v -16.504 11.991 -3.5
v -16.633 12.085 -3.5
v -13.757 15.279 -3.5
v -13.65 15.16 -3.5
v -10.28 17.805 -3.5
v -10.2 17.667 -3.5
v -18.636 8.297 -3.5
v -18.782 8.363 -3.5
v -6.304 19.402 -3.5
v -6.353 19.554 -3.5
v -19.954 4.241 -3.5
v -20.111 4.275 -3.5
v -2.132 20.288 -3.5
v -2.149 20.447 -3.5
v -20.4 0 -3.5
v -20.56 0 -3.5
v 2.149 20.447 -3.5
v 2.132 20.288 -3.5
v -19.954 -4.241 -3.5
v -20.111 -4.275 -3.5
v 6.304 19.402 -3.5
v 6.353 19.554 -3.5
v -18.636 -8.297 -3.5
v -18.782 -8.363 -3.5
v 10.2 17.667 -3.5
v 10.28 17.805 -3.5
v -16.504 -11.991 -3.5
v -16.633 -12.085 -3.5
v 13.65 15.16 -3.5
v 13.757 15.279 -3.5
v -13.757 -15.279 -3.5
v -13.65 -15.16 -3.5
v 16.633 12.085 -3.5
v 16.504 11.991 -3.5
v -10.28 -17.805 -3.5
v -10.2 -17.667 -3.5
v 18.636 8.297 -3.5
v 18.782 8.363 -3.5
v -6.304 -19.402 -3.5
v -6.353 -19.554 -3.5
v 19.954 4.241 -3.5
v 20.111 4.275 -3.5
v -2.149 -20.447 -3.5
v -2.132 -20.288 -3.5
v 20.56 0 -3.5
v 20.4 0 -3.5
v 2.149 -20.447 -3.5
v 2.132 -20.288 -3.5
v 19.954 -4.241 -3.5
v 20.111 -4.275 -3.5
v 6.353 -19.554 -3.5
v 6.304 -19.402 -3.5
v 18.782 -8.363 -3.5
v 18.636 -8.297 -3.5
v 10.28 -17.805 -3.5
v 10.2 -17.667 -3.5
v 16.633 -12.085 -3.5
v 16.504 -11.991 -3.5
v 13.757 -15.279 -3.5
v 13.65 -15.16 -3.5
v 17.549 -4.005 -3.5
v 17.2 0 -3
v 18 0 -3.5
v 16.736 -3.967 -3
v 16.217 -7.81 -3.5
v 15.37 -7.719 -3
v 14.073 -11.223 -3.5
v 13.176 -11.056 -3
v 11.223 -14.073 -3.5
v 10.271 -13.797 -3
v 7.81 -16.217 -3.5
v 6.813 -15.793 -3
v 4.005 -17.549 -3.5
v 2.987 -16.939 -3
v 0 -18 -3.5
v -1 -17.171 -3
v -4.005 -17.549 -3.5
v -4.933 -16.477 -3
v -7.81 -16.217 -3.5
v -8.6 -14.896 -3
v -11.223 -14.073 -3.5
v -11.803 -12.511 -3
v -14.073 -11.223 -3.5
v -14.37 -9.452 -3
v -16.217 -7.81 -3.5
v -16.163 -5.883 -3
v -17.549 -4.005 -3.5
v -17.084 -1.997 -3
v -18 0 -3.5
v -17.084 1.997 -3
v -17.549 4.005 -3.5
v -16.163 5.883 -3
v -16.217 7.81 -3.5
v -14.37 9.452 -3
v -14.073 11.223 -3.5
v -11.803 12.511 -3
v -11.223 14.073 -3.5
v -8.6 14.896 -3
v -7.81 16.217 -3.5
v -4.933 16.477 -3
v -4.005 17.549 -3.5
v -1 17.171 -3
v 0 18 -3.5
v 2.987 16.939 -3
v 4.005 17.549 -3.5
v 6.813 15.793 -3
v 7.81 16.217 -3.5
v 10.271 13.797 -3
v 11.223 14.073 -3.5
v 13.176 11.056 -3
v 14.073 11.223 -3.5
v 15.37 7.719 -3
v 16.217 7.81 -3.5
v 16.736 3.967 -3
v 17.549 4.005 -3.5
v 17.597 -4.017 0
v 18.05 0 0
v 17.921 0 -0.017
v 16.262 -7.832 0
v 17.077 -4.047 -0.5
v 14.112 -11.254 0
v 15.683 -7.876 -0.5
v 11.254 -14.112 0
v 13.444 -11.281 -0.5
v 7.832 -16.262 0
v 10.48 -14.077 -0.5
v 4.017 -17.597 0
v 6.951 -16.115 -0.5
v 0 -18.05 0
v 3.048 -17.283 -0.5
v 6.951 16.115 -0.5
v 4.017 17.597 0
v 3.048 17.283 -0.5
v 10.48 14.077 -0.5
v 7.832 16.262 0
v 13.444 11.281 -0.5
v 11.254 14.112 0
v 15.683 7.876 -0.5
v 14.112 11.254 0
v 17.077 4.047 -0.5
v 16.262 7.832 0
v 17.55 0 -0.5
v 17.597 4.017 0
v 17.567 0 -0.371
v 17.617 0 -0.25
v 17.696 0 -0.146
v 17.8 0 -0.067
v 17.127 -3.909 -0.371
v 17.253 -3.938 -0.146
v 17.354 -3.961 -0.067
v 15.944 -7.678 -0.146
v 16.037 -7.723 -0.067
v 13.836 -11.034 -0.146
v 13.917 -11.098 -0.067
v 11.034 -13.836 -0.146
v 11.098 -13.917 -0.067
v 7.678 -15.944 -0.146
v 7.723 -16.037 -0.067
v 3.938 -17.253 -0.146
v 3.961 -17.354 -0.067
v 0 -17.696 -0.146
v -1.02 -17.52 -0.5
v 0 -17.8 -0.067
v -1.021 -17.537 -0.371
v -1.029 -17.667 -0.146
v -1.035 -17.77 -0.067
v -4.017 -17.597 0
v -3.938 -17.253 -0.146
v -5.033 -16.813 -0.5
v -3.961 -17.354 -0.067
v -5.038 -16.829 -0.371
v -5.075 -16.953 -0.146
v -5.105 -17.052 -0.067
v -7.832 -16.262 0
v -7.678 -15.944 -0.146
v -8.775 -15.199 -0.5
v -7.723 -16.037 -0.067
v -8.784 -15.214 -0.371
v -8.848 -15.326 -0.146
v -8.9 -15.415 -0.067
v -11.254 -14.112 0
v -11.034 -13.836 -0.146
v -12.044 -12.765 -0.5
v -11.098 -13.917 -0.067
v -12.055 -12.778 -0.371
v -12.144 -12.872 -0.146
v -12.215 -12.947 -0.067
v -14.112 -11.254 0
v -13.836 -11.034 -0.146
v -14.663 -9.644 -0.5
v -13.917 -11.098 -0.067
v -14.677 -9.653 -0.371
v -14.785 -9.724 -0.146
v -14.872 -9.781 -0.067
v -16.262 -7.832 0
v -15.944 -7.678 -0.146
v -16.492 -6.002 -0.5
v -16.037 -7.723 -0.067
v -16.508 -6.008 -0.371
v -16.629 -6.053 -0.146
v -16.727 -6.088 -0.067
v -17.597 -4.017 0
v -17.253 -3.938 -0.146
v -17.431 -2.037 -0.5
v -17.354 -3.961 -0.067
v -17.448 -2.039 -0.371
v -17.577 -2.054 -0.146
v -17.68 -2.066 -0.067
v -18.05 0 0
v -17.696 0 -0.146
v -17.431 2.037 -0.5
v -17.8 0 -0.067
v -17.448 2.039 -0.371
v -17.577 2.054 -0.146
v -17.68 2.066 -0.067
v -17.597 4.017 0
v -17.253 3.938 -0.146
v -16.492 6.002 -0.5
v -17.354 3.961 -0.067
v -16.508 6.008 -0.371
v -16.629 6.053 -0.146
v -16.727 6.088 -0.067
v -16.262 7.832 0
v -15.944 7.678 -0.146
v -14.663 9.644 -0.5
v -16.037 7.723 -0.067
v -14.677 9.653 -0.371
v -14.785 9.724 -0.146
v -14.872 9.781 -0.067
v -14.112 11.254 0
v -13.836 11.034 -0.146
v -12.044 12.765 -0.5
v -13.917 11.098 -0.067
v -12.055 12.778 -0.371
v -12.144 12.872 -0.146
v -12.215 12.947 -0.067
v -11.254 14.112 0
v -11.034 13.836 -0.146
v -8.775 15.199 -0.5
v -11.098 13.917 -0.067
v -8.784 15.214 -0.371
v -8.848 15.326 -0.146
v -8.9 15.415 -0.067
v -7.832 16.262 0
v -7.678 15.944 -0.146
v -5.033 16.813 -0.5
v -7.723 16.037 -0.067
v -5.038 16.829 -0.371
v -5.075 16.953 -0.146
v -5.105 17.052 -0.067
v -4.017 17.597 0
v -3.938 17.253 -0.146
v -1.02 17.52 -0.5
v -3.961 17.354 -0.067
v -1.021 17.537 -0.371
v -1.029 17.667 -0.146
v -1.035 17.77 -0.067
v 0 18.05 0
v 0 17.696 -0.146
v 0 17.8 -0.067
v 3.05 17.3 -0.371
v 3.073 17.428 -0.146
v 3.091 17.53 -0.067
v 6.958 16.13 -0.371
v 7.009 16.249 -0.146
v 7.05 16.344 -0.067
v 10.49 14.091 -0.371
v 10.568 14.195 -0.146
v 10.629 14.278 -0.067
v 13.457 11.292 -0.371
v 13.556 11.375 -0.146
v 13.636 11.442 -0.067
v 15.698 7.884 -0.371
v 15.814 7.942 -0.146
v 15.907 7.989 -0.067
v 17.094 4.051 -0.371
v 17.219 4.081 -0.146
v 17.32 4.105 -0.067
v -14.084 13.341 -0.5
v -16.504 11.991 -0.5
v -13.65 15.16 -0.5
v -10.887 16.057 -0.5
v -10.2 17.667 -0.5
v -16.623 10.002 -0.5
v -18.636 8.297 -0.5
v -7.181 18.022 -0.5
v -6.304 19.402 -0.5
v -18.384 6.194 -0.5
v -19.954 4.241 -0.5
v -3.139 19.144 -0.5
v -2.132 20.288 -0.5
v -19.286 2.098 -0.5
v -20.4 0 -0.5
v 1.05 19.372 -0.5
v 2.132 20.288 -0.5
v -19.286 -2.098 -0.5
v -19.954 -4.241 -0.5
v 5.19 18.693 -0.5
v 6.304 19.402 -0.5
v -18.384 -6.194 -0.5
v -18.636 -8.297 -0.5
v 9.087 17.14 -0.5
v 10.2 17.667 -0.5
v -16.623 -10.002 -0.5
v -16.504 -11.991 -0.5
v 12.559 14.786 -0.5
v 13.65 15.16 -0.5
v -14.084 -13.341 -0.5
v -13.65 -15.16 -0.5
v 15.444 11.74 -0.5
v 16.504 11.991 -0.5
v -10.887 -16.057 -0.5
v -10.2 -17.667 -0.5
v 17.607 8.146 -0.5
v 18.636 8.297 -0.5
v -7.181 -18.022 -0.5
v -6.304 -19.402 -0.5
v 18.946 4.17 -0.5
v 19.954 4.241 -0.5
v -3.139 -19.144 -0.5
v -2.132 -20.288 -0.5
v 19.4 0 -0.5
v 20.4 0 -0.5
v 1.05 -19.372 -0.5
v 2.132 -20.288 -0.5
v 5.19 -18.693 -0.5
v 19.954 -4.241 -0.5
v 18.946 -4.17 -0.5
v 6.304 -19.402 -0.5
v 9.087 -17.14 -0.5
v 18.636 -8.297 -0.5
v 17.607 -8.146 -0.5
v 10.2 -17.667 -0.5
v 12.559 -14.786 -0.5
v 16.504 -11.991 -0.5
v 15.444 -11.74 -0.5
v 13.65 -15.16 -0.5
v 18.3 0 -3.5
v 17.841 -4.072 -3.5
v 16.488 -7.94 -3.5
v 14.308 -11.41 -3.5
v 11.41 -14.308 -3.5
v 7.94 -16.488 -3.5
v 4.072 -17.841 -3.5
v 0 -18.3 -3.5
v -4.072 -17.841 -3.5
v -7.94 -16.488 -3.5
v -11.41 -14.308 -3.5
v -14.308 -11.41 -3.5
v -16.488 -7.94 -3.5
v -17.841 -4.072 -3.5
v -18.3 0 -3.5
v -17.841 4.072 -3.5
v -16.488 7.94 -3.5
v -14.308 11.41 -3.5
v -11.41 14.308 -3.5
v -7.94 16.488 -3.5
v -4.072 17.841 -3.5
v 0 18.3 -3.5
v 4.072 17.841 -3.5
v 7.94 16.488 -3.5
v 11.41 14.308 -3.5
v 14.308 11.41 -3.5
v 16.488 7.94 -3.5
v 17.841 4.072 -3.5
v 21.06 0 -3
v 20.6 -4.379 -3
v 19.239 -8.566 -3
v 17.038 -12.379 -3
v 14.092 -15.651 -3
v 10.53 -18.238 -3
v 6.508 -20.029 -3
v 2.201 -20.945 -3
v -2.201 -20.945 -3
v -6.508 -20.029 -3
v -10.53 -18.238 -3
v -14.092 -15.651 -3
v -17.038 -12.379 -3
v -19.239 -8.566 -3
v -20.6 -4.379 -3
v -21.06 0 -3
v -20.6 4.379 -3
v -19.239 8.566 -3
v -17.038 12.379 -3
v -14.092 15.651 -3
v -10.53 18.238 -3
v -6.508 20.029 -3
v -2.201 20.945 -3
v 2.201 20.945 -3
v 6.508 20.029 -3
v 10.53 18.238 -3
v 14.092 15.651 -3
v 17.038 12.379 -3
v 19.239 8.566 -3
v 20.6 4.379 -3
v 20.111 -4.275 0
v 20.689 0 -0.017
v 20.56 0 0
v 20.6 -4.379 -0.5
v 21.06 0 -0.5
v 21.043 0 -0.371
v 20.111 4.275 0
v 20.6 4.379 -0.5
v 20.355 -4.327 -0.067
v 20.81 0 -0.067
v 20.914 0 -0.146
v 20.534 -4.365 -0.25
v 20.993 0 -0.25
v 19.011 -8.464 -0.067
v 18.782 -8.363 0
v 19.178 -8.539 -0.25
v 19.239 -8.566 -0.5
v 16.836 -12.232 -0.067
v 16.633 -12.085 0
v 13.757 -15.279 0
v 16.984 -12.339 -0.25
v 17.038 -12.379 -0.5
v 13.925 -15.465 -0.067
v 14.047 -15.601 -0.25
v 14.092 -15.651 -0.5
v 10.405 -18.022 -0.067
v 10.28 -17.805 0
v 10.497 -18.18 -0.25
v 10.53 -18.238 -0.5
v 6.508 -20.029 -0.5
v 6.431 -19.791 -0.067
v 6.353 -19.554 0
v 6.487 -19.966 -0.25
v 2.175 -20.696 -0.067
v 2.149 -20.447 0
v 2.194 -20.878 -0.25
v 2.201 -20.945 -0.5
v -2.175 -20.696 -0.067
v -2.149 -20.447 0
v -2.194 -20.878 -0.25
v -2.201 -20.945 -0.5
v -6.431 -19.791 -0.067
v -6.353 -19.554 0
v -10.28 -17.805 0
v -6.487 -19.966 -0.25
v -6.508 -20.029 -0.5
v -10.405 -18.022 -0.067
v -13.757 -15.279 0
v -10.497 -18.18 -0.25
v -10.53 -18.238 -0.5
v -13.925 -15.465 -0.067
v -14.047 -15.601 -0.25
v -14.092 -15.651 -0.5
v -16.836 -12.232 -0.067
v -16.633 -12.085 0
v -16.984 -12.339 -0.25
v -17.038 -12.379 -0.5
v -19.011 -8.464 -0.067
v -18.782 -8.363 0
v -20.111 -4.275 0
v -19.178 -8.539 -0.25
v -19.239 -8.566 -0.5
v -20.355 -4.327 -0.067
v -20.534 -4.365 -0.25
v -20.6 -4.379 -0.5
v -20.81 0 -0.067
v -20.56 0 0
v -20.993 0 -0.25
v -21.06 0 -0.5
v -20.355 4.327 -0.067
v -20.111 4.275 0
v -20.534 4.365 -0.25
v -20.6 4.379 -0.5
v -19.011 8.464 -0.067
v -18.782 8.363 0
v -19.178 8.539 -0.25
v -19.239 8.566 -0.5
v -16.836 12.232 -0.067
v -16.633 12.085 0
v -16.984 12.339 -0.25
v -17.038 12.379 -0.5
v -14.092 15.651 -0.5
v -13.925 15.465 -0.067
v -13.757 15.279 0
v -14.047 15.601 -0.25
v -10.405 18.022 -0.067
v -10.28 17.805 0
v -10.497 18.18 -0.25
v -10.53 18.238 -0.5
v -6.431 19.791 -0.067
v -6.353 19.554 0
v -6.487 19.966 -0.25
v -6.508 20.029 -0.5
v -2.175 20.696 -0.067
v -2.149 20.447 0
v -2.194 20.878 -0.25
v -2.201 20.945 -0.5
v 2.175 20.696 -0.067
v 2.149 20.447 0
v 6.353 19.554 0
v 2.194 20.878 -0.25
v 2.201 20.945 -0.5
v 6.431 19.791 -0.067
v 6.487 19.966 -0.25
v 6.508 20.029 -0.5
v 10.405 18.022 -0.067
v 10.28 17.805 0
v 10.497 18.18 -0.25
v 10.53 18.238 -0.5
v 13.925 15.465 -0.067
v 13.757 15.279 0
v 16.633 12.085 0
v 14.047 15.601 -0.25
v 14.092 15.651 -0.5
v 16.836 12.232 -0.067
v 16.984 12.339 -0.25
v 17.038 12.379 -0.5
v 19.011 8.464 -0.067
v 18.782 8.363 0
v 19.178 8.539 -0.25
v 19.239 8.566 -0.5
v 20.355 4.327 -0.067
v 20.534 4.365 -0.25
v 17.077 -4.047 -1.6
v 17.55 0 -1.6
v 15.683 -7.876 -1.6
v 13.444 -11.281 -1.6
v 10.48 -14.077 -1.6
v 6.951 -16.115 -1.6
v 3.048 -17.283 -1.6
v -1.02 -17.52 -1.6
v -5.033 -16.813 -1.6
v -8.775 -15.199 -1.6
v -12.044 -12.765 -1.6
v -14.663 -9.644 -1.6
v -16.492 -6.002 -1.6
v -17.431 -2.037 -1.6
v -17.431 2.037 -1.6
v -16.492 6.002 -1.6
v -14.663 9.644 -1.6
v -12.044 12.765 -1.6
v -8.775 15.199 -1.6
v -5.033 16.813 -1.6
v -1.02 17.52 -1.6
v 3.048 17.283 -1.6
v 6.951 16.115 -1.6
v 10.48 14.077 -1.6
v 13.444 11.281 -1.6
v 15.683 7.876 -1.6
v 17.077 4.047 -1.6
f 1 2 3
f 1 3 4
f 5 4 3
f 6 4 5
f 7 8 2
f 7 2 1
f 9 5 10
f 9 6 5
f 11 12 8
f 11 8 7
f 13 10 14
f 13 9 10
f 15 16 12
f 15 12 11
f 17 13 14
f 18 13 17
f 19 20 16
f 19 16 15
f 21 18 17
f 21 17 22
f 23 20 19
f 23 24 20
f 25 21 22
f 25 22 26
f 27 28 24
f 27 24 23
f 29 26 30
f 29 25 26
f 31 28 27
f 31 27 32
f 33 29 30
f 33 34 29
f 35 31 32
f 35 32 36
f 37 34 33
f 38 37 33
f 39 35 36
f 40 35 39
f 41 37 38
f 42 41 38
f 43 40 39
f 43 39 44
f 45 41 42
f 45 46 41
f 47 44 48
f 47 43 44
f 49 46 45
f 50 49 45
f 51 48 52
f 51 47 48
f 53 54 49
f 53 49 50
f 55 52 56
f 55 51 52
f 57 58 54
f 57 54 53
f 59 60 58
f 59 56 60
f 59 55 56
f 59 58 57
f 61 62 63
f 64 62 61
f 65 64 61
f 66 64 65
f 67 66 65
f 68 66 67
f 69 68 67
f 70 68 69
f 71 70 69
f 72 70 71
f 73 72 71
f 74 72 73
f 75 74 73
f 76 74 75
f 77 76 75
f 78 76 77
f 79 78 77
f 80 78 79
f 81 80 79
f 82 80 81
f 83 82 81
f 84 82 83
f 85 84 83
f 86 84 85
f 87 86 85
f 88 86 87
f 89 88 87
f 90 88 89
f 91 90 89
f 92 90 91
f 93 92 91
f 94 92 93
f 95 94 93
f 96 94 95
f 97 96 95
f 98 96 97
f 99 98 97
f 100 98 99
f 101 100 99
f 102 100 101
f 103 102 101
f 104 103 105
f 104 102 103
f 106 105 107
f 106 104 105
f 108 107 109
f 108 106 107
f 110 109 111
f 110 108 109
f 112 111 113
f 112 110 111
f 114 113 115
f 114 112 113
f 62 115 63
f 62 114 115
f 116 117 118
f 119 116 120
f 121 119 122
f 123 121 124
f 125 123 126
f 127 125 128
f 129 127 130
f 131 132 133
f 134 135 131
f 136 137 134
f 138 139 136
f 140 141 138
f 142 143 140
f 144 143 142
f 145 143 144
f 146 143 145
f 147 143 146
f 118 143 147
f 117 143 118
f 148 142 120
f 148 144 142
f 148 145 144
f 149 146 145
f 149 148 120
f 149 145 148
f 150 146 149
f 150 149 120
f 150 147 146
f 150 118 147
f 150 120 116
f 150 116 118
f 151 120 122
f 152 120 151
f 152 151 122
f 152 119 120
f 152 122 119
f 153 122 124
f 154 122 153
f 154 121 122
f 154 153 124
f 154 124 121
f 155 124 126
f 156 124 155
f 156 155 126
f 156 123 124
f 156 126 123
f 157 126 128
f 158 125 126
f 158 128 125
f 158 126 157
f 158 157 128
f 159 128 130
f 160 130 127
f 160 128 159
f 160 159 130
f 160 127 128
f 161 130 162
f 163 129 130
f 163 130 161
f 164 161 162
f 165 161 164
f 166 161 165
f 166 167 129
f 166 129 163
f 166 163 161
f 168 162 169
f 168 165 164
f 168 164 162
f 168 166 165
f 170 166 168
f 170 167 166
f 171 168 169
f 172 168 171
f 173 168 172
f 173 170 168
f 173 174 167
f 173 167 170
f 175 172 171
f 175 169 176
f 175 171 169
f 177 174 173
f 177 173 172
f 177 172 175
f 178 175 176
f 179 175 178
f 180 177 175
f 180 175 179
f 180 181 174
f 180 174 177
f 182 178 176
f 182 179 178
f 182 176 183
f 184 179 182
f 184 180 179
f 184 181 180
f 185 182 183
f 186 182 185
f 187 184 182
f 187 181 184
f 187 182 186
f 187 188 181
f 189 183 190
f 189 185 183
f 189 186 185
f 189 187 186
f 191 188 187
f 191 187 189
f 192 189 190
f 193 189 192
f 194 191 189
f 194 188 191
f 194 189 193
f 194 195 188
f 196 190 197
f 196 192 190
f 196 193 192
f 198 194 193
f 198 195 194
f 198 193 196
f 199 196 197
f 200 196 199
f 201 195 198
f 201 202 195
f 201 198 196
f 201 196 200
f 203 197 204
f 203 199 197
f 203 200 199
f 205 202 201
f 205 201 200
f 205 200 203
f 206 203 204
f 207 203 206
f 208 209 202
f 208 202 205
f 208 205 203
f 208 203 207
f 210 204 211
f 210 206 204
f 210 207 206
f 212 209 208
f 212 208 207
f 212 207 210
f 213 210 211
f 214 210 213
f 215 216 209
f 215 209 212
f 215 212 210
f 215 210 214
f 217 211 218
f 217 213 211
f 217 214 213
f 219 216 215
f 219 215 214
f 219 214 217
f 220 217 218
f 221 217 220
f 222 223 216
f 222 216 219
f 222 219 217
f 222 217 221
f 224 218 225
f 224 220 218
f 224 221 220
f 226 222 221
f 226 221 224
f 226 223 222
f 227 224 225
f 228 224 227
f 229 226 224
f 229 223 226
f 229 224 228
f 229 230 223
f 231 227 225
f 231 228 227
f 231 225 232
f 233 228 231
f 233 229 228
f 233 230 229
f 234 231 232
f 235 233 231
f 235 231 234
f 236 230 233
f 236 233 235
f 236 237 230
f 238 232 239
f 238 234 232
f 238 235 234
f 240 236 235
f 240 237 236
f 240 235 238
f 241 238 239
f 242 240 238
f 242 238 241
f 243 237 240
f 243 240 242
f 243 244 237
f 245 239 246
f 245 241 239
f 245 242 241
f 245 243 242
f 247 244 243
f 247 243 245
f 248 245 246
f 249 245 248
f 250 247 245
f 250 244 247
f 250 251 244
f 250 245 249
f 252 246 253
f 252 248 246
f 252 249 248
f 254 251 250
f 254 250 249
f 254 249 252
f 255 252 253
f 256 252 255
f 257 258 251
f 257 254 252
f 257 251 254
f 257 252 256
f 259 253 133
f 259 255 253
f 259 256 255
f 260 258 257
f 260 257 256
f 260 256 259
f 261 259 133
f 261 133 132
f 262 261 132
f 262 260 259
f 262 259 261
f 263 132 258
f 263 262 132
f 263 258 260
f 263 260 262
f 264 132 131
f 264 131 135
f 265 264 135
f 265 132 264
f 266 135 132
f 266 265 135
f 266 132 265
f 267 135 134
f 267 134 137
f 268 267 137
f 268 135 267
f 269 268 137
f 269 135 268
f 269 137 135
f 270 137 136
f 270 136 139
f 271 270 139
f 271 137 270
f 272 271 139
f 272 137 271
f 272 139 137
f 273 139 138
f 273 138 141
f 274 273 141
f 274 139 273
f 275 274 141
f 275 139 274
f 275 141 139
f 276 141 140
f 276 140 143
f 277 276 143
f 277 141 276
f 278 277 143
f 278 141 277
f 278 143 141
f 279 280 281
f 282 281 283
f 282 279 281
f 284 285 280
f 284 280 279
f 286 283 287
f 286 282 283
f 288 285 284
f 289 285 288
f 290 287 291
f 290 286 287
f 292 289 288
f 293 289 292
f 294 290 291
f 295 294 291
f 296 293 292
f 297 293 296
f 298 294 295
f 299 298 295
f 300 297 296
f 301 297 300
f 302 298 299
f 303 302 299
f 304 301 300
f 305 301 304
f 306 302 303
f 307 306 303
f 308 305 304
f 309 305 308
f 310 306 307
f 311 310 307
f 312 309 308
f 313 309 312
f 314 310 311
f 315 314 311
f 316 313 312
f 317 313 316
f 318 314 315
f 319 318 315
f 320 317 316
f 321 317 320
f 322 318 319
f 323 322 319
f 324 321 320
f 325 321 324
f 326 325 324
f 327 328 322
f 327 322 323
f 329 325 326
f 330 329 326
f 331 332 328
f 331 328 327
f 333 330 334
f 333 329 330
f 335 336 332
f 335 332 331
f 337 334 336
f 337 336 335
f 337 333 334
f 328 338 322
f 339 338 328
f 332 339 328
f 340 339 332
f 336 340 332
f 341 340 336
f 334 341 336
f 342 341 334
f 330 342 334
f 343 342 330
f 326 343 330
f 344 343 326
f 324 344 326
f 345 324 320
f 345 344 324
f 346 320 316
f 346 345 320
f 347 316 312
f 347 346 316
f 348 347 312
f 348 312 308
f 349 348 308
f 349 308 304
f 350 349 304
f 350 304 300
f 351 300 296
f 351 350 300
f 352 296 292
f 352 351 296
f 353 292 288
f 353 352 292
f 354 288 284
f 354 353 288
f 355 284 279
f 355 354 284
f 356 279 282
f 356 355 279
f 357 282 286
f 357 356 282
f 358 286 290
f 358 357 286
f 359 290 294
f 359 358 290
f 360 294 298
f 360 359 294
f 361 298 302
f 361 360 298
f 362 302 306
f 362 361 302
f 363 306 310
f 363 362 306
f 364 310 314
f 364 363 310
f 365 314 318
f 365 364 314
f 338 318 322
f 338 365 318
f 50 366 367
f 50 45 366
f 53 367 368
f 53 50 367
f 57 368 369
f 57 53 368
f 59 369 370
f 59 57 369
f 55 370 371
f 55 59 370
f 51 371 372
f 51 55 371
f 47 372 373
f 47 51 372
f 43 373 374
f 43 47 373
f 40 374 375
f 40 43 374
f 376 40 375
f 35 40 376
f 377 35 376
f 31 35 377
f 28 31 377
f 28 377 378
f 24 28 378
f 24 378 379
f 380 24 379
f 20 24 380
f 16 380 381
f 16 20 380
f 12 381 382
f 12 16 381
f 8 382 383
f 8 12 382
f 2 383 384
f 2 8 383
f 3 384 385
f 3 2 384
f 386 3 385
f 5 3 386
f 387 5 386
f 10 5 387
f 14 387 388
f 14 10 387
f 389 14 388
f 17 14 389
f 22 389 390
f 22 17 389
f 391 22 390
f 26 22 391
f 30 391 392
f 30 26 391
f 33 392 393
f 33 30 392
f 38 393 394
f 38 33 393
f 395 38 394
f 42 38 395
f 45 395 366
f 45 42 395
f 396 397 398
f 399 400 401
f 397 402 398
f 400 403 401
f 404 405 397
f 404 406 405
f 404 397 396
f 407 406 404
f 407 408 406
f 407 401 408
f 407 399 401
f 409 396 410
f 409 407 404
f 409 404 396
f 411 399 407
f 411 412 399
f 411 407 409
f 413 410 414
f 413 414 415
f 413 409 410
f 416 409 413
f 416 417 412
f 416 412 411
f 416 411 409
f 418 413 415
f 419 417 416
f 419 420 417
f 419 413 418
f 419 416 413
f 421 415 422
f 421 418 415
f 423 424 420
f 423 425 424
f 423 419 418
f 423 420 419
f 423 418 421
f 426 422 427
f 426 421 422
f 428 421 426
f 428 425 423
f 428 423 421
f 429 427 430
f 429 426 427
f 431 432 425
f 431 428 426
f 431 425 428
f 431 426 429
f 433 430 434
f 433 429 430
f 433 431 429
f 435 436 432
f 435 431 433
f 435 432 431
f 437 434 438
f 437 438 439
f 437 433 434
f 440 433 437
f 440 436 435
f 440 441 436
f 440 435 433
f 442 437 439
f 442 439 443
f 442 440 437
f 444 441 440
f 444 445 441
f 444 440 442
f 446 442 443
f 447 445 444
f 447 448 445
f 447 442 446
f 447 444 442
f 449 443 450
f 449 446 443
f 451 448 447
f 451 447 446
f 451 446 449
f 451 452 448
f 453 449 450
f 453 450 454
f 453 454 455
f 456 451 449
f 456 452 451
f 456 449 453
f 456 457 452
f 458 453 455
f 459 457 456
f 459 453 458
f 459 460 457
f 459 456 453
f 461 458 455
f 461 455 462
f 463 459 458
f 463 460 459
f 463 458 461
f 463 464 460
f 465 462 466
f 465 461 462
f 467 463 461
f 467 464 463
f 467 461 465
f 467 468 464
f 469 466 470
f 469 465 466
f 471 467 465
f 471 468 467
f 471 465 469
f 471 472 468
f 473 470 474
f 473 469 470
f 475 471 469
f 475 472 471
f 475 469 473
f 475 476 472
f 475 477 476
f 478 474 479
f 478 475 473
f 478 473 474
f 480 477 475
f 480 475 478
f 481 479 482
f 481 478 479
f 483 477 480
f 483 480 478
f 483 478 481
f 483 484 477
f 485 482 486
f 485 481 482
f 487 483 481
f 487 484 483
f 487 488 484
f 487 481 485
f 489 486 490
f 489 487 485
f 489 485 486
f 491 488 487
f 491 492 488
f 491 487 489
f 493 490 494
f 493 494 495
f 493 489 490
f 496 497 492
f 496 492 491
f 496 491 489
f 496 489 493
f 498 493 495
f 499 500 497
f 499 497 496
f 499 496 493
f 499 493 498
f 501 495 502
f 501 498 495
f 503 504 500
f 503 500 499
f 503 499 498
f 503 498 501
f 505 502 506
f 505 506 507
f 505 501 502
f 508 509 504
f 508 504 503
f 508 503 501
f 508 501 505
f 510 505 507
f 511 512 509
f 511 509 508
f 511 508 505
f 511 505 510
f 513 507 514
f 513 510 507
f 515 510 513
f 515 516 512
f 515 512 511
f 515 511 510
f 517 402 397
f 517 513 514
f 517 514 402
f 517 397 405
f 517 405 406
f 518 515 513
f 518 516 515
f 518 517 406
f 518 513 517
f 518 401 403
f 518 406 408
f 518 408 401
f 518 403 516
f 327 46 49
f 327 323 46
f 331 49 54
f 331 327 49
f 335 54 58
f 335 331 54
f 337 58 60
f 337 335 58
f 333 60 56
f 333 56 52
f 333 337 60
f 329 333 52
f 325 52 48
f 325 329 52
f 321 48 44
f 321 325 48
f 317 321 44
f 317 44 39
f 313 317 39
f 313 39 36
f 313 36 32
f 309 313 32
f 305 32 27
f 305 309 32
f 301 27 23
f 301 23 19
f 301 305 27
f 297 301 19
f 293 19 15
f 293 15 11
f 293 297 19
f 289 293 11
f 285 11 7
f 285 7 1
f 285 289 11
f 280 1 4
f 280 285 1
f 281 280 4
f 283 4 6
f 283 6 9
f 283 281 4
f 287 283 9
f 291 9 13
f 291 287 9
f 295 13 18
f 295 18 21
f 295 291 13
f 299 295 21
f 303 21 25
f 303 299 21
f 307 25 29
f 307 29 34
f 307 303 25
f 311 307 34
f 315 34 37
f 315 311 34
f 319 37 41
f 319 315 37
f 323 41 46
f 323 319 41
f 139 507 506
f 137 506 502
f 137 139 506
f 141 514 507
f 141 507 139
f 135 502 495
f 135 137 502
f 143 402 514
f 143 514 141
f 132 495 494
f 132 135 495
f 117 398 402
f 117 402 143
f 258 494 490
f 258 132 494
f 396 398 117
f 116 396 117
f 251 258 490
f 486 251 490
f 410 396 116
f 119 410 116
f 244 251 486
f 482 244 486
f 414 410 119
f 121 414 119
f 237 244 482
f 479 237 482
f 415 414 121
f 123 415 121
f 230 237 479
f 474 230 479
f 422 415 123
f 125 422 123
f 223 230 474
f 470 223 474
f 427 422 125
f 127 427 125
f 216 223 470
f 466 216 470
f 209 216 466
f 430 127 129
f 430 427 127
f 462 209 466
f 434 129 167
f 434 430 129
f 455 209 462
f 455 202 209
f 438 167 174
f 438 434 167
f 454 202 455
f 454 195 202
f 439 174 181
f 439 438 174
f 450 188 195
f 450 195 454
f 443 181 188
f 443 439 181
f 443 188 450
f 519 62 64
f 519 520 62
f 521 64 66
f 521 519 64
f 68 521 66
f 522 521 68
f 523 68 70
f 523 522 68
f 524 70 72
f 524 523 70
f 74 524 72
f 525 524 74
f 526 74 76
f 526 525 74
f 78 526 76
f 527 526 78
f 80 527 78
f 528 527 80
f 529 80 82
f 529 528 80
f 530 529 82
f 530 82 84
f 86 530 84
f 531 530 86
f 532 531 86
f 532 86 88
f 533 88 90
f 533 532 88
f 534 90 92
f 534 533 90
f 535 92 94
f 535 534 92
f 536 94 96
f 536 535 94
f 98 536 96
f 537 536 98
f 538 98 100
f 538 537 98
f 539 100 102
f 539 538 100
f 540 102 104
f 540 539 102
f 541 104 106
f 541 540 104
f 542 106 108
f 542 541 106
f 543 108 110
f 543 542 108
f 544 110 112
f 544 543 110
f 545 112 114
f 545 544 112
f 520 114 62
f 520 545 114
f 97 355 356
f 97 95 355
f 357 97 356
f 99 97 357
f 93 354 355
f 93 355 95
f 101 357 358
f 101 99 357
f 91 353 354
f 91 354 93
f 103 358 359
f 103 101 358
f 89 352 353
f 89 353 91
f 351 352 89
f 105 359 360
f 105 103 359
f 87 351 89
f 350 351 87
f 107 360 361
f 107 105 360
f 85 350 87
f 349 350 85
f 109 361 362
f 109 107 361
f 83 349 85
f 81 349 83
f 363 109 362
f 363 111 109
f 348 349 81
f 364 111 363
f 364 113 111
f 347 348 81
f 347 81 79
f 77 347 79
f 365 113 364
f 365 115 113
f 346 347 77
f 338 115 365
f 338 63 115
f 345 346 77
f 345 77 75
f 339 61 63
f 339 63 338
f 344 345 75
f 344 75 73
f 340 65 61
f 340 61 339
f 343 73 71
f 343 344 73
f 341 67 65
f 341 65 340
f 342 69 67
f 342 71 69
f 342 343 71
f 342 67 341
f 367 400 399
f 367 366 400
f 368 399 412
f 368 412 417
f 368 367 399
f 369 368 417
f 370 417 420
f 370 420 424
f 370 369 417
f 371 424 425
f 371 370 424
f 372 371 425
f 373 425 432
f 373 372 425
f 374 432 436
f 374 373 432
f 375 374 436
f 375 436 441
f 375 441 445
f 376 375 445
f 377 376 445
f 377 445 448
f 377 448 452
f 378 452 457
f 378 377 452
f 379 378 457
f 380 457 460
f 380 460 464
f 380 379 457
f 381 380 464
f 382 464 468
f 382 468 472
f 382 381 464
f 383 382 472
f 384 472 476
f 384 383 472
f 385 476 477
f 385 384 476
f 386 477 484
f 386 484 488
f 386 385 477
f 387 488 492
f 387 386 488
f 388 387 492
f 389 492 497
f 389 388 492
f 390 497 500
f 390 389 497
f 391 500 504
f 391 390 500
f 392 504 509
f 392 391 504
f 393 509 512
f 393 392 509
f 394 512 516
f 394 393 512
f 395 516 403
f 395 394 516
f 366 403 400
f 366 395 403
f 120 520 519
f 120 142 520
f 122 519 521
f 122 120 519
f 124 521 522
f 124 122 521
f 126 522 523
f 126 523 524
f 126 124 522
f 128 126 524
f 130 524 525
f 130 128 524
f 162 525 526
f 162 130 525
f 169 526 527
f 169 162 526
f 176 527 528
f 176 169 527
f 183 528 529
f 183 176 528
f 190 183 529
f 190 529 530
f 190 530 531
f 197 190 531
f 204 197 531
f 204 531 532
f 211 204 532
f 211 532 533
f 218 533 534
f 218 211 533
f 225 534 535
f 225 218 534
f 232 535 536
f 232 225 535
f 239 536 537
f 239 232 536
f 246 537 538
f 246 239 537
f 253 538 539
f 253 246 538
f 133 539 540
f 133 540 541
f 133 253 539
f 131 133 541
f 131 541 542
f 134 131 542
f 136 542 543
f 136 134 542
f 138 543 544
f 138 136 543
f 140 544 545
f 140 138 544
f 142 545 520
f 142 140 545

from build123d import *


with BuildPart() as part:
    # Sketch1 → Revolve1 (revolve)
    with BuildSketch(Plane(origin=(0, 0, 0), x_dir=(0, 0, -1), z_dir=(1, 0, 0)), mode=Mode.PRIVATE) as revolve1_sk:
        with BuildLine():
            Line((0, 18.05), (0, 20.56))
            ThreePointArc((0, 20.56), (0.146446609, 20.913553391), (0.5, 21.06))
            Line((0.5, 21.06), (3, 21.06))
            Line((3, 21.06), (3.5, 20.56))
            Line((3.5, 20.56), (3.5, 20.4))
            Line((3.5, 20.4), (0.5, 20.4))
            Line((0.5, 20.4), (0.5, 19.4))
            Line((0.5, 19.4), (3.5, 18.3))
            Line((3.5, 18.3), (3.5, 18))
            Line((3.5, 18), (3, 17.2))
            Line((3, 17.2), (1.6, 17.55))
            Line((1.6, 17.55), (0.5, 17.55))
            ThreePointArc((0.5, 17.55), (0.146446609, 17.696446609), (0, 18.05))
        make_face()
    revolve(revolve1_sk.sketch.rotate(Axis((0, 0, 0), (0, 0, -1)), 90), axis=Axis((0, 0, 0), (0, 0, -1)))


solid = part.part
